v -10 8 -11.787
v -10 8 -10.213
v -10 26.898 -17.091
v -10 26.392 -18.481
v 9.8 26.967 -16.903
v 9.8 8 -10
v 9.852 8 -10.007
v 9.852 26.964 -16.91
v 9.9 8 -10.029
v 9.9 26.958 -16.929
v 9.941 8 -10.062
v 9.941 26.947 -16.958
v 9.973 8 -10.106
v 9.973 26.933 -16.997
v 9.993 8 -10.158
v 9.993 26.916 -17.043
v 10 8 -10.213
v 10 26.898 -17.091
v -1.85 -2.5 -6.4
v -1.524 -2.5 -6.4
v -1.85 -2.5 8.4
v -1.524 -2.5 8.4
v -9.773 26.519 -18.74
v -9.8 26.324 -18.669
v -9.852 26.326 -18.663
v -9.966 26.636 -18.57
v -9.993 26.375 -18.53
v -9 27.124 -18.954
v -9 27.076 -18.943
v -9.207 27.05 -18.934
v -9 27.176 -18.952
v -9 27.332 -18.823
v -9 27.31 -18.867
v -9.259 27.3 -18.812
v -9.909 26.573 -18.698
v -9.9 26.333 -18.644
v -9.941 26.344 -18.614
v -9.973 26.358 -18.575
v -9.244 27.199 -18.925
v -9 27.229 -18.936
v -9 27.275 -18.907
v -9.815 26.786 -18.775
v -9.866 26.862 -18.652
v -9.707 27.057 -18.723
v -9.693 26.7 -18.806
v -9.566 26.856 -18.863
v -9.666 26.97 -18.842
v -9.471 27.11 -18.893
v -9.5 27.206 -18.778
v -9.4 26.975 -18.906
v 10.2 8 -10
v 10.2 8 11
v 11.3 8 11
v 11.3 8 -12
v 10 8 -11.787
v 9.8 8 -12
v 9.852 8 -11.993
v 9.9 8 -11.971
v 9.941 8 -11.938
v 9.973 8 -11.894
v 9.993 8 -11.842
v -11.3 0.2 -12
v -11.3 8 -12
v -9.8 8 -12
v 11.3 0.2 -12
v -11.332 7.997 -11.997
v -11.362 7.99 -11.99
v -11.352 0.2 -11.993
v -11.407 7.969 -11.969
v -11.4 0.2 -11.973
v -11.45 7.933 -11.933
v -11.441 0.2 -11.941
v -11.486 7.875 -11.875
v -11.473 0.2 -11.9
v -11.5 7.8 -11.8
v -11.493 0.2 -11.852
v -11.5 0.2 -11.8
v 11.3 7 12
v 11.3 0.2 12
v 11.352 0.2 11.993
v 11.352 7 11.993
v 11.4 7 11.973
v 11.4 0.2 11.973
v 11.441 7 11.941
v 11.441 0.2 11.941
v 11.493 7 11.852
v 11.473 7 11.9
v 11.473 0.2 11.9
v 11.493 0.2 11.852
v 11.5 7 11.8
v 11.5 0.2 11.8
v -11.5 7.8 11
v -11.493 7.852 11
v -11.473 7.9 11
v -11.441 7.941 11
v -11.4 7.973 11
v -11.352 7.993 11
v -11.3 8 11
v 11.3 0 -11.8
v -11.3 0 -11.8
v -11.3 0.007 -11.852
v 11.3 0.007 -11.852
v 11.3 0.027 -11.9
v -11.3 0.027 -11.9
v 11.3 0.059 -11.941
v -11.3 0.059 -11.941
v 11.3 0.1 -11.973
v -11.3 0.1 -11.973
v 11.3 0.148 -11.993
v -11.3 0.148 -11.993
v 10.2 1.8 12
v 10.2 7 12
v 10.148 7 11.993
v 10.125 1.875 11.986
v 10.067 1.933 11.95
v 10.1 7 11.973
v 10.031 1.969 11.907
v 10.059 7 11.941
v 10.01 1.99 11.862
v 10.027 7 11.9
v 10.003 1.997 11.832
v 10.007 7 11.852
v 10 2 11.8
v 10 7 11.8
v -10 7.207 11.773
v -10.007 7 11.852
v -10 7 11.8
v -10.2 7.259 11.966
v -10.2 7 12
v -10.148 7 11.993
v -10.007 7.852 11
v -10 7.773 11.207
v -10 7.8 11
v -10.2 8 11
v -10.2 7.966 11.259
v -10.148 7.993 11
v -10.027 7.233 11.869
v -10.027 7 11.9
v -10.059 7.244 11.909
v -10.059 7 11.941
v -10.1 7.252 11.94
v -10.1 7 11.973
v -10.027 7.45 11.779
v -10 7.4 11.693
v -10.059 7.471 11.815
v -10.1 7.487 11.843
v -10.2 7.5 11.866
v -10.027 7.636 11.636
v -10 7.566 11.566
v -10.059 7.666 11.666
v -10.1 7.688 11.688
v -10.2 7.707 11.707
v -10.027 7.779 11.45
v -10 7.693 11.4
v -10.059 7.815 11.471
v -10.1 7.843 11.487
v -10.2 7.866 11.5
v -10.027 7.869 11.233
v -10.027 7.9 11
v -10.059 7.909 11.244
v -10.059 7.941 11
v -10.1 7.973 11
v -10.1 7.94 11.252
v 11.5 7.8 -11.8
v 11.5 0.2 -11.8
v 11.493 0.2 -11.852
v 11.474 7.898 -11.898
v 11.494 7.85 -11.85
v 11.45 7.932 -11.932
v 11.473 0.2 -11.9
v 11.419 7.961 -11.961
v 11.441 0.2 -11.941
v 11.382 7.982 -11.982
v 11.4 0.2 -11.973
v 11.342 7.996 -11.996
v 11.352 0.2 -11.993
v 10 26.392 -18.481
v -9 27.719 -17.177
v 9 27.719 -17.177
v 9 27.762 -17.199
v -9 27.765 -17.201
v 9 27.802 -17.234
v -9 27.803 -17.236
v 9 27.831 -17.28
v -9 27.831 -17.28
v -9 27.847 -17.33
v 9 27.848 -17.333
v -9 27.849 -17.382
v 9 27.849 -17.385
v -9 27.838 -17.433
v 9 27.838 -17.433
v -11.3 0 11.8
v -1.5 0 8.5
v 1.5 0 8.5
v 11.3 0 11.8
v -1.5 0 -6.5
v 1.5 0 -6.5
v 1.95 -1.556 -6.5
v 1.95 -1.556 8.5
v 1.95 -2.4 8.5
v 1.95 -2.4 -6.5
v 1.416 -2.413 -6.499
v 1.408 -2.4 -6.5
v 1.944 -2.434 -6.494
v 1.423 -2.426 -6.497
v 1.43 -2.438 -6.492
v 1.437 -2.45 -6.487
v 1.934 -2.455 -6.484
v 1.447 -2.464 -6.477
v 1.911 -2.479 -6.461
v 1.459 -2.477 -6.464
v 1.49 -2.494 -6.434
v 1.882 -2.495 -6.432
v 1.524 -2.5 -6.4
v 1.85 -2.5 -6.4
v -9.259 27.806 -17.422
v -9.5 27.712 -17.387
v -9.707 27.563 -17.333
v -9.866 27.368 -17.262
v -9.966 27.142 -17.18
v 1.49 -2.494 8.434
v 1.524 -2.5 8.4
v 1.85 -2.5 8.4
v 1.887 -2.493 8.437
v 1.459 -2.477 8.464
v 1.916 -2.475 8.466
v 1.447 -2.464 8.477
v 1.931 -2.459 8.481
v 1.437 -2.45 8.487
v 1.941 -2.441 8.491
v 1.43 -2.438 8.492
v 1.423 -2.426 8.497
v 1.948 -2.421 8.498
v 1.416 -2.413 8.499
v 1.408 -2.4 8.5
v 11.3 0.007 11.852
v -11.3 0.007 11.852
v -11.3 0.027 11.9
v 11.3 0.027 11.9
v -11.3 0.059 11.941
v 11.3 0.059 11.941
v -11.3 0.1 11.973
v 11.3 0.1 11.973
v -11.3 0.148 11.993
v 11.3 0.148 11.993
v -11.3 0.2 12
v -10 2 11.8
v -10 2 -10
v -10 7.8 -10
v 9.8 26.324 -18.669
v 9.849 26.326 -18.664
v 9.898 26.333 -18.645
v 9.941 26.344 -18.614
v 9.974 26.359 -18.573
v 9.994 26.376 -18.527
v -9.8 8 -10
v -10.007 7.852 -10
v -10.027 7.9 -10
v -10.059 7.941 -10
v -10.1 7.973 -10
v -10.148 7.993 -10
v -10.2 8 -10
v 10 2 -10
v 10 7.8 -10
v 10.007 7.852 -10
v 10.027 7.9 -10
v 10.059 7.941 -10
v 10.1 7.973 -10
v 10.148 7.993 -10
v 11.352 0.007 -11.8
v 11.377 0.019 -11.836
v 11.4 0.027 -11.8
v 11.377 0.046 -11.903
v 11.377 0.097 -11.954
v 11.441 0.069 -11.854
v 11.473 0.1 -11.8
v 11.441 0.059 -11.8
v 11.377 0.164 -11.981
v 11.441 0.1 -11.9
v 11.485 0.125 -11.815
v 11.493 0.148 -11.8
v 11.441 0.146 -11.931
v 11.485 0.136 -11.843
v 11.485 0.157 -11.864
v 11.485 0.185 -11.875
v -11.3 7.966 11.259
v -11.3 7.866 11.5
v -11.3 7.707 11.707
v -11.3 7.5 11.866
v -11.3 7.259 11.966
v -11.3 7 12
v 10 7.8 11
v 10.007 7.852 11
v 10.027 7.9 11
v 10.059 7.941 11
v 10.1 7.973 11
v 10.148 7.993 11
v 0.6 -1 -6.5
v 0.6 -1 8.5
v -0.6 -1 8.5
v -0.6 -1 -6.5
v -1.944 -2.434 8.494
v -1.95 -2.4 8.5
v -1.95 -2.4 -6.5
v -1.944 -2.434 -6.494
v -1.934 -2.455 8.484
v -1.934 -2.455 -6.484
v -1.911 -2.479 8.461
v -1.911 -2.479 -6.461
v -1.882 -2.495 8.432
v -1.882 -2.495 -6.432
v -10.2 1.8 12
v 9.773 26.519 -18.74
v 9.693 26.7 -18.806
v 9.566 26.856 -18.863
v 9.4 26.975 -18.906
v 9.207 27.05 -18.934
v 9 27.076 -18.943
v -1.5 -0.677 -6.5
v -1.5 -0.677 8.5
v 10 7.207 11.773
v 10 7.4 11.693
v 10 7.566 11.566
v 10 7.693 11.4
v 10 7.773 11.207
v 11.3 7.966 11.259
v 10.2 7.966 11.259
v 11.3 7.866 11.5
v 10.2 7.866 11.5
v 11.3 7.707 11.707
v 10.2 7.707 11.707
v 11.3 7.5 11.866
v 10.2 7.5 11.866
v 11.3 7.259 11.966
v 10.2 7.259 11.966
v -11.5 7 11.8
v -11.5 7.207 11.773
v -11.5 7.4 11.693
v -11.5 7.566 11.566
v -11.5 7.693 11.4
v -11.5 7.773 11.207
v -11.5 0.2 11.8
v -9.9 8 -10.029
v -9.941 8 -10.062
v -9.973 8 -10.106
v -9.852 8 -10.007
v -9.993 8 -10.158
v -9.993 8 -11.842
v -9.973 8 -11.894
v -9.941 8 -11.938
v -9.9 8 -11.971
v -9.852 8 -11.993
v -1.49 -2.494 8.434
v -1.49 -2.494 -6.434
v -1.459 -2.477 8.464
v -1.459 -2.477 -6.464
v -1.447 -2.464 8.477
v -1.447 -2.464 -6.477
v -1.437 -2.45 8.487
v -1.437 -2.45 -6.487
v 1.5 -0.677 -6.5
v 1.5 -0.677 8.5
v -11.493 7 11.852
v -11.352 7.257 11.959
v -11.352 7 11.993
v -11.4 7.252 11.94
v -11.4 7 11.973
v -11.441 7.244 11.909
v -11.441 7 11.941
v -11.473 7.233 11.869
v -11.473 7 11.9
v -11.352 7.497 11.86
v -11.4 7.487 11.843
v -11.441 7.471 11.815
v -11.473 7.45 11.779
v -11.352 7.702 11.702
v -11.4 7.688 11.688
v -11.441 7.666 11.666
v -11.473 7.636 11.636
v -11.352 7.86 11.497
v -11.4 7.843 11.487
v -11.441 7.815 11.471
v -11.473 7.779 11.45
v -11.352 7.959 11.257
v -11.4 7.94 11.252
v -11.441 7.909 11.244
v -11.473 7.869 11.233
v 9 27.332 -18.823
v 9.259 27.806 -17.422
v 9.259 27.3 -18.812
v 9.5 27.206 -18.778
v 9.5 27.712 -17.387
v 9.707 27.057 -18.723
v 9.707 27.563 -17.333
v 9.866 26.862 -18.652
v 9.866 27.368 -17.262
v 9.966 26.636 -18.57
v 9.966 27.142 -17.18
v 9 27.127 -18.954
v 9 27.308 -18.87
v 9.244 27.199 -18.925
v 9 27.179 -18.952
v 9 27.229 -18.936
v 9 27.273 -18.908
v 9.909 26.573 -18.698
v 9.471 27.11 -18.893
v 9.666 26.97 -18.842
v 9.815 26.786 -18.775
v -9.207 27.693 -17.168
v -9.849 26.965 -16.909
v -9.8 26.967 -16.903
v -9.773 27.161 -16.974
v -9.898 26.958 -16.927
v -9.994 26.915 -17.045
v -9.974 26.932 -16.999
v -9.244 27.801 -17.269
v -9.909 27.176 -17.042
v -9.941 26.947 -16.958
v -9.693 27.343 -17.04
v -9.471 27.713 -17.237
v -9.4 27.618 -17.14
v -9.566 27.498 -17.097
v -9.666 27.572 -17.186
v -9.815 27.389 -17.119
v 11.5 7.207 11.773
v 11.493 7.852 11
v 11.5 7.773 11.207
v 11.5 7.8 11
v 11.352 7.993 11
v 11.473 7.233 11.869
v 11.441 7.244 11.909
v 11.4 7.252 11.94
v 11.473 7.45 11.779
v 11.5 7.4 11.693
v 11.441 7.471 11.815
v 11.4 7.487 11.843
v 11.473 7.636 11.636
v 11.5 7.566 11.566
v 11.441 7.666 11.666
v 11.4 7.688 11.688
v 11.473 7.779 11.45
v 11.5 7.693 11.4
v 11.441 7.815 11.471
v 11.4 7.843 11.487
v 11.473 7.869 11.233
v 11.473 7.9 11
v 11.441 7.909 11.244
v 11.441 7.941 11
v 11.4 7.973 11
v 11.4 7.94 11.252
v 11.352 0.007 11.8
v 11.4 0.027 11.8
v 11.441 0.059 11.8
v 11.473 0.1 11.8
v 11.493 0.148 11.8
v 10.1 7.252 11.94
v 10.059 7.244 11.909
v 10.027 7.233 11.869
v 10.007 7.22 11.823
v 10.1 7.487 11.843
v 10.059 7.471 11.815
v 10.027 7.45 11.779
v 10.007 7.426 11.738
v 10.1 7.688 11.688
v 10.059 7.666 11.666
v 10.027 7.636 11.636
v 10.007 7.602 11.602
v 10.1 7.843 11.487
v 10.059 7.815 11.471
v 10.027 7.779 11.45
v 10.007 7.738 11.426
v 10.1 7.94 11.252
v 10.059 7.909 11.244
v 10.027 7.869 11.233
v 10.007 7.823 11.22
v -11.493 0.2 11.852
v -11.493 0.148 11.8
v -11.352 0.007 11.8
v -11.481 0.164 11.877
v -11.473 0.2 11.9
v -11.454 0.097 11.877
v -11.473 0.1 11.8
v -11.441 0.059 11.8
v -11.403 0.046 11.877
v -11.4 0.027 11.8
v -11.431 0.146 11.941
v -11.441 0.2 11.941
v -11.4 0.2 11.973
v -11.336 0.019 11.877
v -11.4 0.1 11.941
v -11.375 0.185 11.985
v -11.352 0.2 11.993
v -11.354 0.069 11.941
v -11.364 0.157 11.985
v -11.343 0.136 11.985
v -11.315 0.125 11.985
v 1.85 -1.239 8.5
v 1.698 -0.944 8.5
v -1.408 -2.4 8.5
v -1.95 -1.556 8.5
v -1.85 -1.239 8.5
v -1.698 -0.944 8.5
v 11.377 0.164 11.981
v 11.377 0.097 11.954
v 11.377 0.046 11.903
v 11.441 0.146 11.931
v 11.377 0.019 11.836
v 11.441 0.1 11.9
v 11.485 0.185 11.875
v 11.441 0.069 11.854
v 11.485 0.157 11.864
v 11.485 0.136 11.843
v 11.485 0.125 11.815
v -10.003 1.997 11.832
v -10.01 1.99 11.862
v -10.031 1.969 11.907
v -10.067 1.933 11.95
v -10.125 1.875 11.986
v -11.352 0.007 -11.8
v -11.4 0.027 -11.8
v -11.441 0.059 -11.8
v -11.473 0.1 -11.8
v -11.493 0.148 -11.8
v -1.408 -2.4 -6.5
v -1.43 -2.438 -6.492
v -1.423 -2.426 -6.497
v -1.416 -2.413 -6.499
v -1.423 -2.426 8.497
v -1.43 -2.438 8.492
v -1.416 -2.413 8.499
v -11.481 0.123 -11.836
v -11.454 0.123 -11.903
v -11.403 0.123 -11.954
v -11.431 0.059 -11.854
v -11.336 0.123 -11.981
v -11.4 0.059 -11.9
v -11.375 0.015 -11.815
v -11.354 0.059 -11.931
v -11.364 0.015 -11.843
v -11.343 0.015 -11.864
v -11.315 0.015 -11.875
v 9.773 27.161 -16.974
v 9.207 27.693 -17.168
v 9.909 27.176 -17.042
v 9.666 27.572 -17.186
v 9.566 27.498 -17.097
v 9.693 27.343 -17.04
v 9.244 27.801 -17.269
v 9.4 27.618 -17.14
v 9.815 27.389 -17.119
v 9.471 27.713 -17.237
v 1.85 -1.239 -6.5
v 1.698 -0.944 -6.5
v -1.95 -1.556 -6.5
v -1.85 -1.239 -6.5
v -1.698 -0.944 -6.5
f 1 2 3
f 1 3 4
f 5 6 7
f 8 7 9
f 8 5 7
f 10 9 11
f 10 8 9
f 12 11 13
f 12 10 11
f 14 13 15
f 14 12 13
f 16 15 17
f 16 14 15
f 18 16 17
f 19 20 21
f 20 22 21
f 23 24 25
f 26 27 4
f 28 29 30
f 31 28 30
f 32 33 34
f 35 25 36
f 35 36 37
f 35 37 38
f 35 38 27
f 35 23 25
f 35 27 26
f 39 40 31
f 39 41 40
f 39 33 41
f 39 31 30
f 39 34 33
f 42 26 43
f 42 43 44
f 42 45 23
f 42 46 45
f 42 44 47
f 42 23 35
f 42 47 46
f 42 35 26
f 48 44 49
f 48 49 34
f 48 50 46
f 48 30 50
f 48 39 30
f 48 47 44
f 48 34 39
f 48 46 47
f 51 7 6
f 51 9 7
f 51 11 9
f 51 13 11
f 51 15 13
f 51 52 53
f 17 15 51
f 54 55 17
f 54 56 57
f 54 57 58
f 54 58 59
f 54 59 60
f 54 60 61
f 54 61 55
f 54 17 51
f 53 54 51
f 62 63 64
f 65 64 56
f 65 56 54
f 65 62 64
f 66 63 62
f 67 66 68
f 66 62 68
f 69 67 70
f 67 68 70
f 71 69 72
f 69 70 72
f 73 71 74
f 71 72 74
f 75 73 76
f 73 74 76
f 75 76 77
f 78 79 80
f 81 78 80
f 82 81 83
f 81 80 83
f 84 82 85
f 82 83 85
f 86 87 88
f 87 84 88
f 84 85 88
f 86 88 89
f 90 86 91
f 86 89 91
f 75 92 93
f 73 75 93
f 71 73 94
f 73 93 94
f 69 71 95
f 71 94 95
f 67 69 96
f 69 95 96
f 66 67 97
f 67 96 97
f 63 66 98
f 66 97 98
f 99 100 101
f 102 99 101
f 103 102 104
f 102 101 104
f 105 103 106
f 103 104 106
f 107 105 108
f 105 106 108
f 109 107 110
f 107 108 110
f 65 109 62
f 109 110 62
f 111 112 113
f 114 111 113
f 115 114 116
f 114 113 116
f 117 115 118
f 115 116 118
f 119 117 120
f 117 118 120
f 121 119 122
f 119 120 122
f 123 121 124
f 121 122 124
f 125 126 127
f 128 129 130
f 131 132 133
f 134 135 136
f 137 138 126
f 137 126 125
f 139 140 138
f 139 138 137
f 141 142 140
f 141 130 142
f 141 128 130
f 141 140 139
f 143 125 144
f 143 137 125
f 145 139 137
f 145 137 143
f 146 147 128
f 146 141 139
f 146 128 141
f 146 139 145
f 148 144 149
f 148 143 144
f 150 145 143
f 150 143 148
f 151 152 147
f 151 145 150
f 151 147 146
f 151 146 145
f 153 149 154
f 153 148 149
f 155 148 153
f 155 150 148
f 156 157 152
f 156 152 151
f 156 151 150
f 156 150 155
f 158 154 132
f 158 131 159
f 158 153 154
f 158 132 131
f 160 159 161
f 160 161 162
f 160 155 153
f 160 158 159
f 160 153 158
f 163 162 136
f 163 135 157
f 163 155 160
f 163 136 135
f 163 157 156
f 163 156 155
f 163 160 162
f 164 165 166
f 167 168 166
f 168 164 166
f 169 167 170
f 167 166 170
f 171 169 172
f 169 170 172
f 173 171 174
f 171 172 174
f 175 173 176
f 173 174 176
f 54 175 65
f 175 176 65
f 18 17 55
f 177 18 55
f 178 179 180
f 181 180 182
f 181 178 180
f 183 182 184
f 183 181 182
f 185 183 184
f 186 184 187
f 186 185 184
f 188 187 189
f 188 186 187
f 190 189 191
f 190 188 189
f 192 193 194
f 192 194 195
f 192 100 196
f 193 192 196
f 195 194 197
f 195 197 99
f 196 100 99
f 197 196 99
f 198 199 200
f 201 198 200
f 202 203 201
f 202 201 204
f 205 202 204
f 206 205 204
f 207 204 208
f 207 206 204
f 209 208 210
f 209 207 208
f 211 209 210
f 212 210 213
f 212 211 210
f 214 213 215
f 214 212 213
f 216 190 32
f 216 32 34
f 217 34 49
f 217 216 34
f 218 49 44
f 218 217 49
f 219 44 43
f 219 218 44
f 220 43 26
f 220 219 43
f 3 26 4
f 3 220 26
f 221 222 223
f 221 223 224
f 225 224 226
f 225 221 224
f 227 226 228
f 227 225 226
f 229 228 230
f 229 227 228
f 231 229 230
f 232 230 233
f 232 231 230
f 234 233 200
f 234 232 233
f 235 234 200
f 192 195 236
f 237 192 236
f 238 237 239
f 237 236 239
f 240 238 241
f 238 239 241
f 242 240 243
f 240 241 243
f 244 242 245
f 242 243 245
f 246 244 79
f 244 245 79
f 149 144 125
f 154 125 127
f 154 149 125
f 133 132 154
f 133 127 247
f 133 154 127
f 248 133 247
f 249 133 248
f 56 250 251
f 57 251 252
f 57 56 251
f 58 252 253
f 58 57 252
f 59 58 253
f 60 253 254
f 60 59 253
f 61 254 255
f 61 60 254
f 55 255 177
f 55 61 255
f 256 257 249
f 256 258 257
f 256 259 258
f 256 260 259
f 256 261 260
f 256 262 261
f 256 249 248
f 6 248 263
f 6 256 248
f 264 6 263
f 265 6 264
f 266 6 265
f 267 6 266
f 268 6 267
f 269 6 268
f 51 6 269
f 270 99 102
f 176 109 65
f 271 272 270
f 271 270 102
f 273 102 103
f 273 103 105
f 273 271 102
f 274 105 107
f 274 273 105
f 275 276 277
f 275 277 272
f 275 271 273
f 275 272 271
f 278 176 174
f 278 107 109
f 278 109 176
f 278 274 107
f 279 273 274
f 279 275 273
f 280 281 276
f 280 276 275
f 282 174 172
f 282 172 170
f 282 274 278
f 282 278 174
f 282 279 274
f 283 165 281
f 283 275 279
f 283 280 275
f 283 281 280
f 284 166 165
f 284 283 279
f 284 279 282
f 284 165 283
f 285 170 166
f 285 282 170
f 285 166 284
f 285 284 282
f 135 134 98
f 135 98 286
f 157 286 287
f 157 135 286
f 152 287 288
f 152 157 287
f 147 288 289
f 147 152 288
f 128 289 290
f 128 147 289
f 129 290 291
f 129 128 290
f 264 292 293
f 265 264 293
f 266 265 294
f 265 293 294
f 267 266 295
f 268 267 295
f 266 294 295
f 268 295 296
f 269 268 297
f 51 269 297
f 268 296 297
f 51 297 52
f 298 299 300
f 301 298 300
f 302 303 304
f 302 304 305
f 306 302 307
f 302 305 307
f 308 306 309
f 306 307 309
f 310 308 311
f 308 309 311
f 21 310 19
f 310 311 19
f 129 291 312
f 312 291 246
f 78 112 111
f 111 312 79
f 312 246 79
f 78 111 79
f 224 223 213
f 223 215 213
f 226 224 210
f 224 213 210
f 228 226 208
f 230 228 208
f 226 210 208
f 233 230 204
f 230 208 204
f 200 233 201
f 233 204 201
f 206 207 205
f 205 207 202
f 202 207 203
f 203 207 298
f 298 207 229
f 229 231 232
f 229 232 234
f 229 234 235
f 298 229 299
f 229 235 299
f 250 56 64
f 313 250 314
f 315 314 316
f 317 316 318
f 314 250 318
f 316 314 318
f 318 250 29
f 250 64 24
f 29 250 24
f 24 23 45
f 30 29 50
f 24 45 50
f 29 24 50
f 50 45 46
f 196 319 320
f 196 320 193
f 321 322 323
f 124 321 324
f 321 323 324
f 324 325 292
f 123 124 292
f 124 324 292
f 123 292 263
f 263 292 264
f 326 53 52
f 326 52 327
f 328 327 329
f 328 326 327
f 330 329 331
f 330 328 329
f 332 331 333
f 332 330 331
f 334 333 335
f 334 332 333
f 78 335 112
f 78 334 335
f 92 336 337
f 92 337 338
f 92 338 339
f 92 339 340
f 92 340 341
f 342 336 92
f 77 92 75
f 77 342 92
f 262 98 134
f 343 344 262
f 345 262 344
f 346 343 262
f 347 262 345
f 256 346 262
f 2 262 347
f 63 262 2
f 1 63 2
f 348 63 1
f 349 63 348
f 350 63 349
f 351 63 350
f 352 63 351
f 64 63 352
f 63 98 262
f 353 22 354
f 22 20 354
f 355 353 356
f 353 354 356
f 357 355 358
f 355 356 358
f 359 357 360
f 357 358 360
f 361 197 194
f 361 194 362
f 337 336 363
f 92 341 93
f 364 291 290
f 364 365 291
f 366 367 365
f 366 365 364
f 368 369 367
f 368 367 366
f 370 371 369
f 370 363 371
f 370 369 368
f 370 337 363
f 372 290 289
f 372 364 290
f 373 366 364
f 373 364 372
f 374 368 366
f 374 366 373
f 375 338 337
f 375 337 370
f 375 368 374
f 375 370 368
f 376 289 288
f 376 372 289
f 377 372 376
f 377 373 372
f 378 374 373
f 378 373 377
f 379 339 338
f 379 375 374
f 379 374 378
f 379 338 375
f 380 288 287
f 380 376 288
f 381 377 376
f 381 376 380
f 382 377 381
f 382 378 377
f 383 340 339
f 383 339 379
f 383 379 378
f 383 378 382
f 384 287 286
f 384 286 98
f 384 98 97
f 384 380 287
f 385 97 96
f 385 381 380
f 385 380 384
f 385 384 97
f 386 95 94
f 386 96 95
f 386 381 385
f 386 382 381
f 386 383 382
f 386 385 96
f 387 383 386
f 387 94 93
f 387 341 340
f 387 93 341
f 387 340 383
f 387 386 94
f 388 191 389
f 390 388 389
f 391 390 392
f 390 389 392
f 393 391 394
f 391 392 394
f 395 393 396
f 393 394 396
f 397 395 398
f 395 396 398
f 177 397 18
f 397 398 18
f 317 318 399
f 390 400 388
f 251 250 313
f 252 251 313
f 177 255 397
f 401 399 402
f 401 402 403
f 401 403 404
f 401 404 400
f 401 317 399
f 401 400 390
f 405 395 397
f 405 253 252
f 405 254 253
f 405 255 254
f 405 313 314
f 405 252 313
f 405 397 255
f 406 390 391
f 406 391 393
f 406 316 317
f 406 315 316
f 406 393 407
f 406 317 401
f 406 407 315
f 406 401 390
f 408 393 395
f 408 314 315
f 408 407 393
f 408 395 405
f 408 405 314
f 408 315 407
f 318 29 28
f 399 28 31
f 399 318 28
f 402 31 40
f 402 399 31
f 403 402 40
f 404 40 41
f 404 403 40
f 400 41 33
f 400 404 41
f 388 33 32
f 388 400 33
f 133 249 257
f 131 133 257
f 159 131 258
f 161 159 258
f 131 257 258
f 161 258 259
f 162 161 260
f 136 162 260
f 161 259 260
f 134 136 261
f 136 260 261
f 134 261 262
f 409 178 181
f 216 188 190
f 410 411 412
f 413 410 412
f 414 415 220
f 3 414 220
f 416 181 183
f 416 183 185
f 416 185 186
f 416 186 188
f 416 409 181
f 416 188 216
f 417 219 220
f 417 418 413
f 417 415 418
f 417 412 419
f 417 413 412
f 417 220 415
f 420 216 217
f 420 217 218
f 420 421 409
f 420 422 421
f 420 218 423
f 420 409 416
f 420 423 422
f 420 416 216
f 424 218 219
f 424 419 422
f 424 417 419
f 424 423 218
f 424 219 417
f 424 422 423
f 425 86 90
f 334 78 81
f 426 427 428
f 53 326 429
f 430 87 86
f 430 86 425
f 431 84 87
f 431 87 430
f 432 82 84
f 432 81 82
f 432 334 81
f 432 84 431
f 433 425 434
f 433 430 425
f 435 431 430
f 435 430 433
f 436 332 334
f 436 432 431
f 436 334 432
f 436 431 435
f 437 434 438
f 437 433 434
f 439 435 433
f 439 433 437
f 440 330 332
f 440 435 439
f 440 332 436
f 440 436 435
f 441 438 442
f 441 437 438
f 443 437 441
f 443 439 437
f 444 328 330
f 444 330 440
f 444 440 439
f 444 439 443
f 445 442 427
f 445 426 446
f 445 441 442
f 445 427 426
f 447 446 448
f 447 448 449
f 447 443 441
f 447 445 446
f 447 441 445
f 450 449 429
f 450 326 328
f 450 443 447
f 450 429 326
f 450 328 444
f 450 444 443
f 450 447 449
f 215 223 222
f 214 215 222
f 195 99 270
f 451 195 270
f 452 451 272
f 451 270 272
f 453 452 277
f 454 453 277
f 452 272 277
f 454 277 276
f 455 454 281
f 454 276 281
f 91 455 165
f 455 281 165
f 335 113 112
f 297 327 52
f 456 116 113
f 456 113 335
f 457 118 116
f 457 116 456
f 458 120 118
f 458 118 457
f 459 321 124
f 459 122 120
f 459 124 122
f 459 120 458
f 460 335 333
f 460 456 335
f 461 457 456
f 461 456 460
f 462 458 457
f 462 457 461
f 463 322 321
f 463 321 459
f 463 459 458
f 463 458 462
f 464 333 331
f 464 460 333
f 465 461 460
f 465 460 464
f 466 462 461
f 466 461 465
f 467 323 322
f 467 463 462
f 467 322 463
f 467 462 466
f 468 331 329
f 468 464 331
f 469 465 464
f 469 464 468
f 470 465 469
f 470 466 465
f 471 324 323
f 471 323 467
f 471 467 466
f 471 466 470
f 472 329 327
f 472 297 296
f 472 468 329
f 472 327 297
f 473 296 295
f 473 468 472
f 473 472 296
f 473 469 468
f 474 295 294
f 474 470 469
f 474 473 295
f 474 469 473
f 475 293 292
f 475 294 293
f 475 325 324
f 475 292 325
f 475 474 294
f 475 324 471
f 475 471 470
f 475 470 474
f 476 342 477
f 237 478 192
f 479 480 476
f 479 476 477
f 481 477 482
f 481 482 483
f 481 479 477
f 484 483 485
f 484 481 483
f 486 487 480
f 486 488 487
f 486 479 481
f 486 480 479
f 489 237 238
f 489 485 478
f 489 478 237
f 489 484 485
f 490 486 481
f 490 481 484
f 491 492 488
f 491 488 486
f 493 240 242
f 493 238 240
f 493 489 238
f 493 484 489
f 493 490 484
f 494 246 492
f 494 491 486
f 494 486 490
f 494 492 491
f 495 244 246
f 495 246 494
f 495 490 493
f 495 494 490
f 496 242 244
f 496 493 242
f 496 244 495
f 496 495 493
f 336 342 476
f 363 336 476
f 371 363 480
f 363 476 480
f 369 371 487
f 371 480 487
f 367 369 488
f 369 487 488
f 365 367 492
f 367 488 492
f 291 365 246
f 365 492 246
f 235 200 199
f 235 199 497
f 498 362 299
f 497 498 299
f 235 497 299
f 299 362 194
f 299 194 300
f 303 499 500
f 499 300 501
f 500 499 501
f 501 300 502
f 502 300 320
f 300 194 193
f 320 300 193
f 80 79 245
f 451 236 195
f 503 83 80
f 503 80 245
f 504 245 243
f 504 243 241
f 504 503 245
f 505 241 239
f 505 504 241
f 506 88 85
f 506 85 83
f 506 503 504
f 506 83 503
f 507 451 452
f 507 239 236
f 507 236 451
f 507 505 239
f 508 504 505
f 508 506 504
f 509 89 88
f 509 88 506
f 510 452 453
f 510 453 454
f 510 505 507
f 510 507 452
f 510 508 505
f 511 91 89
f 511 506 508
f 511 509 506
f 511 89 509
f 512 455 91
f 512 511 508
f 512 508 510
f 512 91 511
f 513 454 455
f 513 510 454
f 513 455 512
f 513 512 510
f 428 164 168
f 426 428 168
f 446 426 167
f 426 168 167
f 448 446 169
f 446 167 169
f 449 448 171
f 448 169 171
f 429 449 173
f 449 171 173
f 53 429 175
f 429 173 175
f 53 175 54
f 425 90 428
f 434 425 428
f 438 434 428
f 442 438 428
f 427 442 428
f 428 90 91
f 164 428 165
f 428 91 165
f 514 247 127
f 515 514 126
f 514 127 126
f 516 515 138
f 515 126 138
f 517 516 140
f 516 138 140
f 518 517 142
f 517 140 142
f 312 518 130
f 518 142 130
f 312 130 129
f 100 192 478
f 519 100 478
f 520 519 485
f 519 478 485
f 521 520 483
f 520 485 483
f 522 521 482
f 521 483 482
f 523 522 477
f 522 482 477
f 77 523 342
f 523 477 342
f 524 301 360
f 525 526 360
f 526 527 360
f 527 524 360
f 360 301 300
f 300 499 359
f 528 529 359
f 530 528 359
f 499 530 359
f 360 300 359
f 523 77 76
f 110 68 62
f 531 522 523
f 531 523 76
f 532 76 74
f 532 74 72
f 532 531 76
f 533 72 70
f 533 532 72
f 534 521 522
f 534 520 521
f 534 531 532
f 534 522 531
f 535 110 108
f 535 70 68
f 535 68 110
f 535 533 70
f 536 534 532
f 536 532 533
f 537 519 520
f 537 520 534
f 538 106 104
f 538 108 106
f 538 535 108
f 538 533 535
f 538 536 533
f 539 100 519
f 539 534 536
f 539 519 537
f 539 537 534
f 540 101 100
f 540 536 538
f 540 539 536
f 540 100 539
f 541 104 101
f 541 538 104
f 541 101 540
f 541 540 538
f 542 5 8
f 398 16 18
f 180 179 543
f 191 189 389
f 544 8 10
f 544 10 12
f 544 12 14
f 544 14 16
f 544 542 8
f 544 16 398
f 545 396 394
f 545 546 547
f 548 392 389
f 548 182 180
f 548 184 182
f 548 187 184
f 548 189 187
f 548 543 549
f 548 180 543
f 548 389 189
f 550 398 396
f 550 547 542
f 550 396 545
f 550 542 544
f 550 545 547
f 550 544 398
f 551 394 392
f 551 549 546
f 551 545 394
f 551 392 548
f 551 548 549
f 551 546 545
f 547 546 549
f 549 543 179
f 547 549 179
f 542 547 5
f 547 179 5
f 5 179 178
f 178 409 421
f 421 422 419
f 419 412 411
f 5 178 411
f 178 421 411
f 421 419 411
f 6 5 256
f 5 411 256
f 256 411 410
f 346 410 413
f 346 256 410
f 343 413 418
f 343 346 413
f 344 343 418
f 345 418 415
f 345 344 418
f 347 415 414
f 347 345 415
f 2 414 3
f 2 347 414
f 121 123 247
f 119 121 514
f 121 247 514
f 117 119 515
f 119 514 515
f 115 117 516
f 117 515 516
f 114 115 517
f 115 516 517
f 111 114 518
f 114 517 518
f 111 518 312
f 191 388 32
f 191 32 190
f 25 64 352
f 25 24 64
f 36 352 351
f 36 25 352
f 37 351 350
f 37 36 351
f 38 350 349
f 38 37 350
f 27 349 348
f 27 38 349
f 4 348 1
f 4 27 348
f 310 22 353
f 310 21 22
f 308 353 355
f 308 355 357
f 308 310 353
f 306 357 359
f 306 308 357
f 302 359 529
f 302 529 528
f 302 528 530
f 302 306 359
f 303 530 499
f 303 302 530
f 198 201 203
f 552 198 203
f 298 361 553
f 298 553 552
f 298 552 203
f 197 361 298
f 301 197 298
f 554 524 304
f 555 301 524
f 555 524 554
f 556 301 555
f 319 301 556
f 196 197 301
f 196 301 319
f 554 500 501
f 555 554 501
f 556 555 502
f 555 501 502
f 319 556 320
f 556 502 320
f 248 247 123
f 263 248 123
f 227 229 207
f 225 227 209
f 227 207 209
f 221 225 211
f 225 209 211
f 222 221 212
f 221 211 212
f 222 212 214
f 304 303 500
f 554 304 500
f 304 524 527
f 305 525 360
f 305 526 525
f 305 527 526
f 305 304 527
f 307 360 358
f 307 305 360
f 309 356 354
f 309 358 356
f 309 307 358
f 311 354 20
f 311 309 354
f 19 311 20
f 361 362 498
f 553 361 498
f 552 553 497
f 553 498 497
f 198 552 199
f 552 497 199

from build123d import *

# Parameters (mm, degrees)
SKETCH_1_W           = 23
SKETCH_1_H           = 24
EXTRUDE_1_DEPTH      = 8
SKETCH_2_W           = 20
SKETCH_2_H           = 22
CUT_EXTRUDE_1_DEPTH  = 6
EXTRUDE_3_DEPTH      = 10
EXTRUDE_3_DEPTH_BACK = 10
EXTRUDE_START        = -3.5
EXTRUDE_4_DEPTH      = 15
FILLET_1_R           = 1
FILLET_3_R           = 0.2
FILLET_4_R           = 0.2
FILLET_6_R           = 0.1


with BuildPart() as part:
    # 草图1 → 凸台-拉伸1 (new body)
    with BuildSketch(Plane(origin=(0, 0, 0), x_dir=(1, 0, 0), z_dir=(0, 1, 0))):
        Rectangle(SKETCH_1_W, SKETCH_1_H)
    extrude(amount=EXTRUDE_1_DEPTH)

    # 草图2 → 切除-拉伸1 (cut)
    with BuildSketch(Plane(origin=(0, 8, 0), x_dir=(1, 0, 0), z_dir=(0, 1, 0))):
        with Locations((0, -1)):
            Rectangle(SKETCH_2_W, SKETCH_2_H)
    extrude(amount=-CUT_EXTRUDE_1_DEPTH, mode=Mode.SUBTRACT)

    # 草图3 → 凸台-拉伸3 (add, two sides: drawn at the far end of the back side and taken through both)
    with BuildSketch(Plane(origin=(0, 0, 0), x_dir=(0, 0, -1), z_dir=(1, 0, 0)).offset(-EXTRUDE_3_DEPTH_BACK)):
        Polygon((12, 8), (19.011412938, 27.263698726), (17.245368495, 27.906486336), (10, 8), align=None)
    extrude(amount=EXTRUDE_3_DEPTH + EXTRUDE_3_DEPTH_BACK)

    # 草图4 → 凸台-拉伸4 (add)
    with BuildSketch(Plane.XY.offset(12).offset(EXTRUDE_START)):
        with BuildLine():
            Line((-1.5, 0), (1.5, 0))
            Line((1.5, 0), (1.5, -0.677124344))
            ThreePointArc((1.5, -0.677124344), (1.780042303, -1.088161527), (1.95, -1.555590279))
            Line((1.95, -1.555590279), (1.95, -2.5))
            Line((1.95, -2.5), (1.466025404, -2.5))
            Line((1.466025404, -2.5), (0.6, -1))
            Line((0.6, -1), (-0.6, -1))
            Line((-0.6, -1), (-1.466025404, -2.5))
            Line((-1.466025404, -2.5), (-1.95, -2.5))
            Line((-1.95, -2.5), (-1.95, -1.555590279))
            ThreePointArc((-1.95, -1.555590279), (-1.780042303, -1.088161527), (-1.5, -0.677124344))
            Line((-1.5, -0.677124344), (-1.5, 0))
        make_face()
    extrude(amount=-EXTRUDE_4_DEPTH)

    # 圆角1
    fillet_1_edges = [part.edges().sort_by_distance(p)[0] for p in [
        (-10.75, 8, 12),
        (10.75, 8, 12),
        (-10, 27.585092531, -18.128390717),
        (10, 27.585092531, -18.128390717),
    ]]
    fillet(fillet_1_edges, radius=FILLET_1_R)

    # 圆角3
    # the kernel refuses this fillet: 0.2 mm, written as the material it takes off along each edge
    with BuildSketch(Plane(origin=(-11.3, 0.2, 11.8), x_dir=(0, -1, 0), z_dir=(0, 0, 1))) as fillet_3_piece_1_section:
        Polygon((0, 0), (FILLET_3_R * 1.02, 0), (FILLET_3_R * 1.02, -FILLET_3_R * 1.02), (0, -FILLET_3_R * 1.02), align=None)
    fillet_3_piece_1 = extrude(amount=FILLET_3_R * 1.02, mode=Mode.PRIVATE)
    fillet_3_piece_1 = fillet_3_piece_1 - Plane(origin=(-11.3, 0.2, 11.8), x_dir=(0.7071067811865475, 0.7071067811865475, 0), z_dir=(0, 0, 1)) * Sphere(FILLET_3_R, mode=Mode.PRIVATE)
    add(fillet_3_piece_1, mode=Mode.SUBTRACT)
    with BuildSketch(Plane(origin=(-11.3, 0.2, -11.8), x_dir=(0, 0, -1), z_dir=(0, -1, 0))) as fillet_3_piece_2_section:
        Polygon((0, 0), (FILLET_3_R * 1.02, 0), (FILLET_3_R * 1.02, -FILLET_3_R * 1.02), (0, -FILLET_3_R * 1.02), align=None)
    fillet_3_piece_2 = extrude(amount=FILLET_3_R * 1.02, mode=Mode.PRIVATE)
    fillet_3_piece_2 = fillet_3_piece_2 - Plane(origin=(-11.3, 0.2, -11.8), x_dir=(0.7071067811865477, 0, 0.7071067811865475), z_dir=(0, -1, 0)) * Sphere(FILLET_3_R, mode=Mode.PRIVATE)
    add(fillet_3_piece_2, mode=Mode.SUBTRACT)
    with BuildSketch(Plane(origin=(11.3, 0.2, -11.8), x_dir=(0, -1, 0), z_dir=(1, 0, 0))) as fillet_3_piece_3_section:
        Polygon((0, 0), (FILLET_3_R * 1.02, 0), (FILLET_3_R * 1.02, FILLET_3_R * 1.02), (0, FILLET_3_R * 1.02), align=None)
    fillet_3_piece_3 = extrude(amount=FILLET_3_R * 1.02, mode=Mode.PRIVATE)
    fillet_3_piece_3 = fillet_3_piece_3 - Plane(origin=(11.3, 0.2, -11.8), x_dir=(0, 0.7071067811865475, 0.7071067811865475), z_dir=(1, 0, 0)) * Sphere(FILLET_3_R, mode=Mode.PRIVATE)
    add(fillet_3_piece_3, mode=Mode.SUBTRACT)
    with BuildSketch(Plane(origin=(11.3, 0.2, 11.8), x_dir=(0, 0, 1), z_dir=(1, 0, 0))) as fillet_3_piece_4_section:
        Polygon((0, 0), (FILLET_3_R * 1.02, 0), (FILLET_3_R * 1.02, FILLET_3_R * 1.02), (0, FILLET_3_R * 1.02), align=None)
    fillet_3_piece_4 = extrude(amount=FILLET_3_R * 1.02, mode=Mode.PRIVATE)
    fillet_3_piece_4 = fillet_3_piece_4 - Plane(origin=(11.3, 0.2, 11.8), x_dir=(0, 0.7071067811865475, -0.7071067811865475), z_dir=(1, 0, 0)) * Sphere(FILLET_3_R, mode=Mode.PRIVATE)
    add(fillet_3_piece_4, mode=Mode.SUBTRACT)
    with BuildSketch(Plane(origin=(-10, 8, -10), x_dir=(0, -1, 0), z_dir=(0, 0, 1))) as fillet_3_piece_5_section:
        with BuildLine():
            CenterArc((FILLET_3_R, -FILLET_3_R), FILLET_3_R, 90, 90)
            Line((0, -FILLET_3_R), (-FILLET_3_R * 0.02, -FILLET_3_R))
            Line((-FILLET_3_R * 0.02, -FILLET_3_R), (-FILLET_3_R * 0.02, FILLET_3_R * 0.02))
            Line((-FILLET_3_R * 0.02, FILLET_3_R * 0.02), (FILLET_3_R, FILLET_3_R * 0.02))
            Line((FILLET_3_R, FILLET_3_R * 0.02), (FILLET_3_R, 0))
        make_face()
    fillet_3_piece_5 = extrude(amount=21, mode=Mode.PRIVATE)
    fillet_3_piece_5 = split(fillet_3_piece_5, bisect_by=Plane(origin=(-10, 7.959305374, 0.5), z_dir=(-1, 0, 0)), keep=Keep.TOP, mode=Mode.PRIVATE)
    add(fillet_3_piece_5, mode=Mode.SUBTRACT)
    with BuildSketch(Plane(origin=(-10, 7, 11), x_dir=(0, 0, 1), z_dir=(0, -1, 0))) as fillet_3_piece_6:
        with BuildLine():
            CenterArc((1 - FILLET_3_R, FILLET_3_R), FILLET_3_R, 270, 90)
            Line((1 - FILLET_3_R, 0), (1 - FILLET_3_R, -FILLET_3_R * 0.02))
            Line((1 - FILLET_3_R, -FILLET_3_R * 0.02), (1 + FILLET_3_R * 0.02, -FILLET_3_R * 0.02))
            Line((1 + FILLET_3_R * 0.02, -FILLET_3_R * 0.02), (1 + FILLET_3_R * 0.02, FILLET_3_R))
            Line((1 + FILLET_3_R * 0.02, FILLET_3_R), (1, FILLET_3_R))
        make_face()
    revolve(axis=Axis((-10, 7, 11), (-1, 0, 0)), revolution_arc=90, mode=Mode.SUBTRACT)
    with BuildSketch(Plane(origin=(10, 8, 11), x_dir=(1, 0, 0), z_dir=(0, 0, -1))) as fillet_3_piece_7_section:
        with BuildLine():
            CenterArc((FILLET_3_R, FILLET_3_R), FILLET_3_R, 180, 90)
            Line((0, FILLET_3_R), (-FILLET_3_R * 0.02, FILLET_3_R))
            Line((-FILLET_3_R * 0.02, FILLET_3_R), (-FILLET_3_R * 0.02, -FILLET_3_R * 0.02))
            Line((-FILLET_3_R * 0.02, -FILLET_3_R * 0.02), (FILLET_3_R, -FILLET_3_R * 0.02))
            Line((FILLET_3_R, -FILLET_3_R * 0.02), (FILLET_3_R, 0))
        make_face()
    fillet_3_piece_7 = extrude(amount=21, mode=Mode.PRIVATE)
    fillet_3_piece_7 = split(fillet_3_piece_7, bisect_by=Plane(origin=(10, 7.959305374, 0.5), z_dir=(1, 0, 0)), keep=Keep.TOP, mode=Mode.PRIVATE)
    add(fillet_3_piece_7, mode=Mode.SUBTRACT)
    with BuildSketch(Plane(origin=(10, 7, 11), x_dir=(0, 0, 1), z_dir=(0, -1, 0))) as fillet_3_piece_8:
        with BuildLine():
            CenterArc((1 - FILLET_3_R, -FILLET_3_R), FILLET_3_R, 0, 90)
            Line((1 - FILLET_3_R, 0), (1 - FILLET_3_R, FILLET_3_R * 0.02))
            Line((1 - FILLET_3_R, FILLET_3_R * 0.02), (1 + FILLET_3_R * 0.02, FILLET_3_R * 0.02))
            Line((1 + FILLET_3_R * 0.02, FILLET_3_R * 0.02), (1 + FILLET_3_R * 0.02, -FILLET_3_R))
            Line((1 + FILLET_3_R * 0.02, -FILLET_3_R), (1, -FILLET_3_R))
        make_face()
    revolve(axis=Axis((10, 7, 11), (-1, 0, 0)), revolution_arc=90, mode=Mode.SUBTRACT)
    with BuildSketch(Plane(origin=(-11.5, 0, 11.8), x_dir=(1, 0, 0), z_dir=(0, 0, -1))) as fillet_3_piece_9:
        with BuildLine():
            CenterArc((FILLET_3_R, -FILLET_3_R), FILLET_3_R, 90, 90)
            Line((0, -FILLET_3_R), (-FILLET_3_R * 0.02, -FILLET_3_R))
            Line((-FILLET_3_R * 0.02, -FILLET_3_R), (-FILLET_3_R * 0.02, FILLET_3_R * 0.02))
            Line((-FILLET_3_R * 0.02, FILLET_3_R * 0.02), (FILLET_3_R, FILLET_3_R * 0.02))
            Line((FILLET_3_R, FILLET_3_R * 0.02), (FILLET_3_R, 0))
        make_face()
    extrude(amount=23.6, mode=Mode.SUBTRACT)
    with BuildSketch(Plane(origin=(-11.5, 0.2, -12), x_dir=(1, 0, 0), z_dir=(0, 1, 0)), Plane(origin=(11.5, 0.2, -12), x_dir=(0, 0, 1), z_dir=(0, 1, 0))) as fillet_3_piece_10:
        with BuildLine():
            CenterArc((FILLET_3_R, -FILLET_3_R), FILLET_3_R, 90, 90)
            Line((0, -FILLET_3_R), (-FILLET_3_R * 0.02, -FILLET_3_R))
            Line((-FILLET_3_R * 0.02, -FILLET_3_R), (-FILLET_3_R * 0.02, FILLET_3_R * 0.02))
            Line((-FILLET_3_R * 0.02, FILLET_3_R * 0.02), (FILLET_3_R, FILLET_3_R * 0.02))
            Line((FILLET_3_R, FILLET_3_R * 0.02), (FILLET_3_R, 0))
        make_face()
    extrude(amount=7.8, mode=Mode.SUBTRACT)
    with BuildSketch(Plane(origin=(-11.5, 8, 11), x_dir=(0, -1, 0), z_dir=(0, 0, -1)), Plane(origin=(11.5, 8, -12), x_dir=(0, -1, 0), z_dir=(0, 0, 1))) as fillet_3_piece_11:
        with BuildLine():
            CenterArc((FILLET_3_R, -FILLET_3_R), FILLET_3_R, 90, 90)
            Line((0, -FILLET_3_R), (-FILLET_3_R * 0.02, -FILLET_3_R))
            Line((-FILLET_3_R * 0.02, -FILLET_3_R), (-FILLET_3_R * 0.02, FILLET_3_R * 0.02))
            Line((-FILLET_3_R * 0.02, FILLET_3_R * 0.02), (FILLET_3_R, FILLET_3_R * 0.02))
            Line((FILLET_3_R, FILLET_3_R * 0.02), (FILLET_3_R, 0))
        make_face()
    extrude(amount=23, mode=Mode.SUBTRACT)
    with BuildSketch(Plane(origin=(-11.5, 7, 11), x_dir=(0, 0, 1), z_dir=(0, -1, 0))) as fillet_3_piece_12:
        with BuildLine():
            CenterArc((1 - FILLET_3_R, -FILLET_3_R), FILLET_3_R, 0, 90)
            Line((1, -FILLET_3_R), (1 + FILLET_3_R * 0.02, -FILLET_3_R))
            Line((1 + FILLET_3_R * 0.02, -FILLET_3_R), (1 + FILLET_3_R * 0.02, FILLET_3_R * 0.02))
            Line((1 + FILLET_3_R * 0.02, FILLET_3_R * 0.02), (1 - FILLET_3_R, FILLET_3_R * 0.02))
            Line((1 - FILLET_3_R, FILLET_3_R * 0.02), (1 - FILLET_3_R, 0))
        make_face()
    revolve(axis=Axis((-11.5, 7, 11), (-1, 0, 0)), revolution_arc=90, mode=Mode.SUBTRACT)
    with BuildSketch(Plane(origin=(11.5, 0, -11.8), x_dir=(0, 1, 0), z_dir=(0, 0, 1))) as fillet_3_piece_13:
        with BuildLine():
            CenterArc((FILLET_3_R, FILLET_3_R), FILLET_3_R, 180, 90)
            Line((0, FILLET_3_R), (-FILLET_3_R * 0.02, FILLET_3_R))
            Line((-FILLET_3_R * 0.02, FILLET_3_R), (-FILLET_3_R * 0.02, -FILLET_3_R * 0.02))
            Line((-FILLET_3_R * 0.02, -FILLET_3_R * 0.02), (FILLET_3_R, -FILLET_3_R * 0.02))
            Line((FILLET_3_R, -FILLET_3_R * 0.02), (FILLET_3_R, 0))
        make_face()
    extrude(amount=23.6, mode=Mode.SUBTRACT)
    with BuildSketch(Plane(origin=(11.5, 7, 11), x_dir=(0, 0, 1), z_dir=(0, -1, 0))) as fillet_3_piece_14:
        with BuildLine():
            CenterArc((1 - FILLET_3_R, FILLET_3_R), FILLET_3_R, 270, 90)
            Line((1, FILLET_3_R), (1 + FILLET_3_R * 0.02, FILLET_3_R))
            Line((1 + FILLET_3_R * 0.02, FILLET_3_R), (1 + FILLET_3_R * 0.02, -FILLET_3_R * 0.02))
            Line((1 + FILLET_3_R * 0.02, -FILLET_3_R * 0.02), (1 - FILLET_3_R, -FILLET_3_R * 0.02))
            Line((1 - FILLET_3_R, -FILLET_3_R * 0.02), (1 - FILLET_3_R, 0))
        make_face()
    revolve(axis=Axis((11.5, 7, 11), (-1, 0, 0)), revolution_arc=90, mode=Mode.SUBTRACT)
    with BuildSketch(Plane(origin=(11.3, 0, 12), x_dir=(0, 1, 0), z_dir=(-1, 0, 0))) as fillet_3_piece_15:
        with BuildLine():
            CenterArc((FILLET_3_R, FILLET_3_R), FILLET_3_R, 180, 90)
            Line((0, FILLET_3_R), (-FILLET_3_R * 0.02, FILLET_3_R))
            Line((-FILLET_3_R * 0.02, FILLET_3_R), (-FILLET_3_R * 0.02, -FILLET_3_R * 0.02))
            Line((-FILLET_3_R * 0.02, -FILLET_3_R * 0.02), (FILLET_3_R, -FILLET_3_R * 0.02))
            Line((FILLET_3_R, -FILLET_3_R * 0.02), (FILLET_3_R, 0))
        make_face()
    extrude(amount=22.6, mode=Mode.SUBTRACT)
    with BuildSketch(Plane(origin=(-11.5, 0.2, 12), x_dir=(1, 0, 0), z_dir=(0, 1, 0)), Plane(origin=(11.5, 0.2, 12), x_dir=(0, 0, -1), z_dir=(0, 1, 0))) as fillet_3_piece_16:
        with BuildLine():
            CenterArc((FILLET_3_R, FILLET_3_R), FILLET_3_R, 180, 90)
            Line((0, FILLET_3_R), (-FILLET_3_R * 0.02, FILLET_3_R))
            Line((-FILLET_3_R * 0.02, FILLET_3_R), (-FILLET_3_R * 0.02, -FILLET_3_R * 0.02))
            Line((-FILLET_3_R * 0.02, -FILLET_3_R * 0.02), (FILLET_3_R, -FILLET_3_R * 0.02))
            Line((FILLET_3_R, -FILLET_3_R * 0.02), (FILLET_3_R, 0))
        make_face()
    extrude(amount=6.8, mode=Mode.SUBTRACT)
    with BuildSketch(Plane(origin=(-10, 7, 12), x_dir=(-1, 0, 0), z_dir=(0, -1, 0))) as fillet_3_piece_17:
        with BuildLine():
            CenterArc((FILLET_3_R, FILLET_3_R), FILLET_3_R, 180, 90)
            Line((0, FILLET_3_R), (-FILLET_3_R * 0.02, FILLET_3_R))
            Line((-FILLET_3_R * 0.02, FILLET_3_R), (-FILLET_3_R * 0.02, -FILLET_3_R * 0.02))
            Line((-FILLET_3_R * 0.02, -FILLET_3_R * 0.02), (FILLET_3_R, -FILLET_3_R * 0.02))
            Line((FILLET_3_R, -FILLET_3_R * 0.02), (FILLET_3_R, 0))
        make_face()
    extrude(amount=5, mode=Mode.SUBTRACT)
    with BuildSketch(Plane(origin=(-10, 2, 12), x_dir=(0, -1, 0), z_dir=(1, 0, 0))) as fillet_3_piece_18:
        with BuildLine():
            CenterArc((FILLET_3_R, FILLET_3_R), FILLET_3_R, 180, 90)
            Line((0, FILLET_3_R), (-FILLET_3_R * 0.02, FILLET_3_R))
            Line((-FILLET_3_R * 0.02, FILLET_3_R), (-FILLET_3_R * 0.02, -FILLET_3_R * 0.02))
            Line((-FILLET_3_R * 0.02, -FILLET_3_R * 0.02), (FILLET_3_R, -FILLET_3_R * 0.02))
            Line((FILLET_3_R, -FILLET_3_R * 0.02), (FILLET_3_R, 0))
        make_face()
    extrude(amount=20, mode=Mode.SUBTRACT)
    with BuildSketch(Plane(origin=(10, 7, 12), x_dir=(1, 0, 0), z_dir=(0, -1, 0))) as fillet_3_piece_19:
        with BuildLine():
            CenterArc((FILLET_3_R, -FILLET_3_R), FILLET_3_R, 90, 90)
            Line((0, -FILLET_3_R), (-FILLET_3_R * 0.02, -FILLET_3_R))
            Line((-FILLET_3_R * 0.02, -FILLET_3_R), (-FILLET_3_R * 0.02, FILLET_3_R * 0.02))
            Line((-FILLET_3_R * 0.02, FILLET_3_R * 0.02), (FILLET_3_R, FILLET_3_R * 0.02))
            Line((FILLET_3_R, FILLET_3_R * 0.02), (FILLET_3_R, 0))
        make_face()
    extrude(amount=5, mode=Mode.SUBTRACT)
    with BuildSketch(Plane(origin=(-11.3, 0, -12), x_dir=(0, 0, 1), z_dir=(1, 0, 0))) as fillet_3_piece_20:
        with BuildLine():
            CenterArc((FILLET_3_R, -FILLET_3_R), FILLET_3_R, 90, 90)
            Line((0, -FILLET_3_R), (-FILLET_3_R * 0.02, -FILLET_3_R))
            Line((-FILLET_3_R * 0.02, -FILLET_3_R), (-FILLET_3_R * 0.02, FILLET_3_R * 0.02))
            Line((-FILLET_3_R * 0.02, FILLET_3_R * 0.02), (FILLET_3_R, FILLET_3_R * 0.02))
            Line((FILLET_3_R, FILLET_3_R * 0.02), (FILLET_3_R, 0))
        make_face()
    extrude(amount=22.6, mode=Mode.SUBTRACT)
    with BuildSketch(Plane(origin=(-11.5, 0.2, -12), x_dir=(1, 0, 0), z_dir=(0, 1, 0))) as fillet_3_piece_21a_section:
        with BuildLine():
            CenterArc((FILLET_3_R, -FILLET_3_R), FILLET_3_R, 90, 90)
            Line((0, -FILLET_3_R), (-FILLET_3_R * 0.02, -FILLET_3_R))
            Line((-FILLET_3_R * 0.02, -FILLET_3_R), (-FILLET_3_R * 0.02, FILLET_3_R * 0.02))
            Line((-FILLET_3_R * 0.02, FILLET_3_R * 0.02), (FILLET_3_R, FILLET_3_R * 0.02))
            Line((FILLET_3_R, FILLET_3_R * 0.02), (FILLET_3_R, 0))
        make_face()
    fillet_3_piece_21a = extrude(amount=8.3, mode=Mode.PRIVATE)
    fillet_3_piece_21a = split(fillet_3_piece_21a, bisect_by=Plane(origin=(-11.454720977, 8, -11.954720977), z_dir=(0, 1, 0)), keep=Keep.TOP, mode=Mode.PRIVATE)
    with BuildSketch(Plane(origin=(-11.5, 8, 11), x_dir=(0, -1, 0), z_dir=(0, 0, -1))) as fillet_3_piece_21b_section:
        with BuildLine():
            CenterArc((FILLET_3_R, -FILLET_3_R), FILLET_3_R, 90, 90)
            Line((0, -FILLET_3_R), (-FILLET_3_R * 0.02, -FILLET_3_R))
            Line((-FILLET_3_R * 0.02, -FILLET_3_R), (-FILLET_3_R * 0.02, FILLET_3_R * 0.02))
            Line((-FILLET_3_R * 0.02, FILLET_3_R * 0.02), (FILLET_3_R, FILLET_3_R * 0.02))
            Line((FILLET_3_R, FILLET_3_R * 0.02), (FILLET_3_R, 0))
        make_face()
    fillet_3_piece_21b = extrude(amount=23.5, mode=Mode.PRIVATE)
    fillet_3_piece_21b = split(fillet_3_piece_21b, bisect_by=Plane(origin=(-11.454720977, 7.954720977, -12), z_dir=(0, 0, -1)), keep=Keep.TOP, mode=Mode.PRIVATE)
    fillet_3_piece_21 = fillet_3_piece_21a & fillet_3_piece_21b
    add(fillet_3_piece_21, mode=Mode.SUBTRACT)
    with BuildSketch(Plane(origin=(11.5, 8, -12.5), x_dir=(0, -1, 0), z_dir=(0, 0, 1))) as fillet_3_piece_22a_section:
        with BuildLine():
            CenterArc((FILLET_3_R, -FILLET_3_R), FILLET_3_R, 90, 90)
            Line((0, -FILLET_3_R), (-FILLET_3_R * 0.02, -FILLET_3_R))
            Line((-FILLET_3_R * 0.02, -FILLET_3_R), (-FILLET_3_R * 0.02, FILLET_3_R * 0.02))
            Line((-FILLET_3_R * 0.02, FILLET_3_R * 0.02), (FILLET_3_R, FILLET_3_R * 0.02))
            Line((FILLET_3_R, FILLET_3_R * 0.02), (FILLET_3_R, 0))
        make_face()
    fillet_3_piece_22a = extrude(amount=23.5, mode=Mode.PRIVATE)
    fillet_3_piece_22a = split(fillet_3_piece_22a, bisect_by=Plane(origin=(11.454720977, 7.954720977, -12), z_dir=(0, 0, -1)), keep=Keep.TOP, mode=Mode.PRIVATE)
    with BuildSketch(Plane(origin=(11.5, 0.2, -12), x_dir=(0, 0, 1), z_dir=(0, 1, 0))) as fillet_3_piece_22b_section:
        with BuildLine():
            CenterArc((FILLET_3_R, -FILLET_3_R), FILLET_3_R, 90, 90)
            Line((0, -FILLET_3_R), (-FILLET_3_R * 0.02, -FILLET_3_R))
            Line((-FILLET_3_R * 0.02, -FILLET_3_R), (-FILLET_3_R * 0.02, FILLET_3_R * 0.02))
            Line((-FILLET_3_R * 0.02, FILLET_3_R * 0.02), (FILLET_3_R, FILLET_3_R * 0.02))
            Line((FILLET_3_R, FILLET_3_R * 0.02), (FILLET_3_R, 0))
        make_face()
    fillet_3_piece_22b = extrude(amount=8.3, mode=Mode.PRIVATE)
    fillet_3_piece_22b = split(fillet_3_piece_22b, bisect_by=Plane(origin=(11.454720977, 8, -11.954720977), z_dir=(0, 1, 0)), keep=Keep.TOP, mode=Mode.PRIVATE)
    fillet_3_piece_22 = fillet_3_piece_22a & fillet_3_piece_22b
    add(fillet_3_piece_22, mode=Mode.SUBTRACT)
    with BuildSketch(Plane(origin=(-10, 7, 12), x_dir=(-1, 0, 0), z_dir=(0, -1, 0))) as fillet_3_piece_23a_section:
        with BuildLine():
            CenterArc((FILLET_3_R, FILLET_3_R), FILLET_3_R, 180, 90)
            Line((0, FILLET_3_R), (-FILLET_3_R * 0.02, FILLET_3_R))
            Line((-FILLET_3_R * 0.02, FILLET_3_R), (-FILLET_3_R * 0.02, -FILLET_3_R * 0.02))
            Line((-FILLET_3_R * 0.02, -FILLET_3_R * 0.02), (FILLET_3_R, -FILLET_3_R * 0.02))
            Line((FILLET_3_R, -FILLET_3_R * 0.02), (FILLET_3_R, 0))
        make_face()
    fillet_3_piece_23a = extrude(amount=5.5, mode=Mode.PRIVATE)
    fillet_3_piece_23a = split(fillet_3_piece_23a, bisect_by=Plane(origin=(-10.045279023, 2, 11.954720977), z_dir=(0, -1, 0)), keep=Keep.TOP, mode=Mode.PRIVATE)
    with BuildSketch(Plane(origin=(-10.5, 2, 12), x_dir=(0, -1, 0), z_dir=(1, 0, 0))) as fillet_3_piece_23b_section:
        with BuildLine():
            CenterArc((FILLET_3_R, FILLET_3_R), FILLET_3_R, 180, 90)
            Line((0, FILLET_3_R), (-FILLET_3_R * 0.02, FILLET_3_R))
            Line((-FILLET_3_R * 0.02, FILLET_3_R), (-FILLET_3_R * 0.02, -FILLET_3_R * 0.02))
            Line((-FILLET_3_R * 0.02, -FILLET_3_R * 0.02), (FILLET_3_R, -FILLET_3_R * 0.02))
            Line((FILLET_3_R, -FILLET_3_R * 0.02), (FILLET_3_R, 0))
        make_face()
    fillet_3_piece_23b = extrude(amount=20.5, mode=Mode.PRIVATE)
    fillet_3_piece_23b = split(fillet_3_piece_23b, bisect_by=Plane(origin=(-10, 1.954720977, 11.954720977), z_dir=(-1, 0, 0)), keep=Keep.TOP, mode=Mode.PRIVATE)
    fillet_3_piece_23 = fillet_3_piece_23a & fillet_3_piece_23b
    add(fillet_3_piece_23, mode=Mode.SUBTRACT)
    with BuildSketch(Plane(origin=(-10, 2, 12), x_dir=(0, -1, 0), z_dir=(1, 0, 0))) as fillet_3_piece_24a_section:
        with BuildLine():
            CenterArc((FILLET_3_R, FILLET_3_R), FILLET_3_R, 180, 90)
            Line((0, FILLET_3_R), (-FILLET_3_R * 0.02, FILLET_3_R))
            Line((-FILLET_3_R * 0.02, FILLET_3_R), (-FILLET_3_R * 0.02, -FILLET_3_R * 0.02))
            Line((-FILLET_3_R * 0.02, -FILLET_3_R * 0.02), (FILLET_3_R, -FILLET_3_R * 0.02))
            Line((FILLET_3_R, -FILLET_3_R * 0.02), (FILLET_3_R, 0))
        make_face()
    fillet_3_piece_24a = extrude(amount=20.5, mode=Mode.PRIVATE)
    fillet_3_piece_24a = split(fillet_3_piece_24a, bisect_by=Plane(origin=(10, 1.954720977, 11.954720977), z_dir=(1, 0, 0)), keep=Keep.TOP, mode=Mode.PRIVATE)
    with BuildSketch(Plane(origin=(10, 7, 12), x_dir=(1, 0, 0), z_dir=(0, -1, 0))) as fillet_3_piece_24b_section:
        with BuildLine():
            CenterArc((FILLET_3_R, -FILLET_3_R), FILLET_3_R, 90, 90)
            Line((0, -FILLET_3_R), (-FILLET_3_R * 0.02, -FILLET_3_R))
            Line((-FILLET_3_R * 0.02, -FILLET_3_R), (-FILLET_3_R * 0.02, FILLET_3_R * 0.02))
            Line((-FILLET_3_R * 0.02, FILLET_3_R * 0.02), (FILLET_3_R, FILLET_3_R * 0.02))
            Line((FILLET_3_R, FILLET_3_R * 0.02), (FILLET_3_R, 0))
        make_face()
    fillet_3_piece_24b = extrude(amount=5.5, mode=Mode.PRIVATE)
    fillet_3_piece_24b = split(fillet_3_piece_24b, bisect_by=Plane(origin=(10.045279023, 2, 11.954720977), z_dir=(0, -1, 0)), keep=Keep.TOP, mode=Mode.PRIVATE)
    fillet_3_piece_24 = fillet_3_piece_24a & fillet_3_piece_24b
    add(fillet_3_piece_24, mode=Mode.SUBTRACT)

    # 圆角4
    fillet_4_edges = [part.edges().sort_by_distance(p)[0] for p in [
        (-10, 17.162003053, -15.334696397),
        (-9.707106781, 26.98846913, -18.911237557),
        (0, 27.263698726, -19.011412938),
        (9.707106781, 26.98846913, -18.911237557),
        (-10, 17.483396858, -13.451674176),
        (-9.707106781, 27.631256739, -17.145193114),
        (0, 27.906486336, -17.245368495),
        (9.707106781, 27.631256739, -17.145193114),
        (10, 17.162003053, -15.334696397),
        (10, 17.483396858, -13.451674176),
    ]]
    fillet(fillet_4_edges, radius=FILLET_4_R)

    # 圆角6
    fillet_6_edges = [part.edges().sort_by_distance(p)[0] for p in [
        (1.466025404, -2.5, 1),
        (-1.708012702, -2.5, -6.5),
        (-1.466025404, -2.5, 1),
        (-1.95, -2.5, 1),
        (1.708012702, -2.5, -6.5),
        (1.95, -2.5, 1),
        (1.708012702, -2.5, 8.5),
        (-1.708012702, -2.5, 8.5),
    ]]
    fillet(fillet_6_edges, radius=FILLET_6_R)


solid = part.part
